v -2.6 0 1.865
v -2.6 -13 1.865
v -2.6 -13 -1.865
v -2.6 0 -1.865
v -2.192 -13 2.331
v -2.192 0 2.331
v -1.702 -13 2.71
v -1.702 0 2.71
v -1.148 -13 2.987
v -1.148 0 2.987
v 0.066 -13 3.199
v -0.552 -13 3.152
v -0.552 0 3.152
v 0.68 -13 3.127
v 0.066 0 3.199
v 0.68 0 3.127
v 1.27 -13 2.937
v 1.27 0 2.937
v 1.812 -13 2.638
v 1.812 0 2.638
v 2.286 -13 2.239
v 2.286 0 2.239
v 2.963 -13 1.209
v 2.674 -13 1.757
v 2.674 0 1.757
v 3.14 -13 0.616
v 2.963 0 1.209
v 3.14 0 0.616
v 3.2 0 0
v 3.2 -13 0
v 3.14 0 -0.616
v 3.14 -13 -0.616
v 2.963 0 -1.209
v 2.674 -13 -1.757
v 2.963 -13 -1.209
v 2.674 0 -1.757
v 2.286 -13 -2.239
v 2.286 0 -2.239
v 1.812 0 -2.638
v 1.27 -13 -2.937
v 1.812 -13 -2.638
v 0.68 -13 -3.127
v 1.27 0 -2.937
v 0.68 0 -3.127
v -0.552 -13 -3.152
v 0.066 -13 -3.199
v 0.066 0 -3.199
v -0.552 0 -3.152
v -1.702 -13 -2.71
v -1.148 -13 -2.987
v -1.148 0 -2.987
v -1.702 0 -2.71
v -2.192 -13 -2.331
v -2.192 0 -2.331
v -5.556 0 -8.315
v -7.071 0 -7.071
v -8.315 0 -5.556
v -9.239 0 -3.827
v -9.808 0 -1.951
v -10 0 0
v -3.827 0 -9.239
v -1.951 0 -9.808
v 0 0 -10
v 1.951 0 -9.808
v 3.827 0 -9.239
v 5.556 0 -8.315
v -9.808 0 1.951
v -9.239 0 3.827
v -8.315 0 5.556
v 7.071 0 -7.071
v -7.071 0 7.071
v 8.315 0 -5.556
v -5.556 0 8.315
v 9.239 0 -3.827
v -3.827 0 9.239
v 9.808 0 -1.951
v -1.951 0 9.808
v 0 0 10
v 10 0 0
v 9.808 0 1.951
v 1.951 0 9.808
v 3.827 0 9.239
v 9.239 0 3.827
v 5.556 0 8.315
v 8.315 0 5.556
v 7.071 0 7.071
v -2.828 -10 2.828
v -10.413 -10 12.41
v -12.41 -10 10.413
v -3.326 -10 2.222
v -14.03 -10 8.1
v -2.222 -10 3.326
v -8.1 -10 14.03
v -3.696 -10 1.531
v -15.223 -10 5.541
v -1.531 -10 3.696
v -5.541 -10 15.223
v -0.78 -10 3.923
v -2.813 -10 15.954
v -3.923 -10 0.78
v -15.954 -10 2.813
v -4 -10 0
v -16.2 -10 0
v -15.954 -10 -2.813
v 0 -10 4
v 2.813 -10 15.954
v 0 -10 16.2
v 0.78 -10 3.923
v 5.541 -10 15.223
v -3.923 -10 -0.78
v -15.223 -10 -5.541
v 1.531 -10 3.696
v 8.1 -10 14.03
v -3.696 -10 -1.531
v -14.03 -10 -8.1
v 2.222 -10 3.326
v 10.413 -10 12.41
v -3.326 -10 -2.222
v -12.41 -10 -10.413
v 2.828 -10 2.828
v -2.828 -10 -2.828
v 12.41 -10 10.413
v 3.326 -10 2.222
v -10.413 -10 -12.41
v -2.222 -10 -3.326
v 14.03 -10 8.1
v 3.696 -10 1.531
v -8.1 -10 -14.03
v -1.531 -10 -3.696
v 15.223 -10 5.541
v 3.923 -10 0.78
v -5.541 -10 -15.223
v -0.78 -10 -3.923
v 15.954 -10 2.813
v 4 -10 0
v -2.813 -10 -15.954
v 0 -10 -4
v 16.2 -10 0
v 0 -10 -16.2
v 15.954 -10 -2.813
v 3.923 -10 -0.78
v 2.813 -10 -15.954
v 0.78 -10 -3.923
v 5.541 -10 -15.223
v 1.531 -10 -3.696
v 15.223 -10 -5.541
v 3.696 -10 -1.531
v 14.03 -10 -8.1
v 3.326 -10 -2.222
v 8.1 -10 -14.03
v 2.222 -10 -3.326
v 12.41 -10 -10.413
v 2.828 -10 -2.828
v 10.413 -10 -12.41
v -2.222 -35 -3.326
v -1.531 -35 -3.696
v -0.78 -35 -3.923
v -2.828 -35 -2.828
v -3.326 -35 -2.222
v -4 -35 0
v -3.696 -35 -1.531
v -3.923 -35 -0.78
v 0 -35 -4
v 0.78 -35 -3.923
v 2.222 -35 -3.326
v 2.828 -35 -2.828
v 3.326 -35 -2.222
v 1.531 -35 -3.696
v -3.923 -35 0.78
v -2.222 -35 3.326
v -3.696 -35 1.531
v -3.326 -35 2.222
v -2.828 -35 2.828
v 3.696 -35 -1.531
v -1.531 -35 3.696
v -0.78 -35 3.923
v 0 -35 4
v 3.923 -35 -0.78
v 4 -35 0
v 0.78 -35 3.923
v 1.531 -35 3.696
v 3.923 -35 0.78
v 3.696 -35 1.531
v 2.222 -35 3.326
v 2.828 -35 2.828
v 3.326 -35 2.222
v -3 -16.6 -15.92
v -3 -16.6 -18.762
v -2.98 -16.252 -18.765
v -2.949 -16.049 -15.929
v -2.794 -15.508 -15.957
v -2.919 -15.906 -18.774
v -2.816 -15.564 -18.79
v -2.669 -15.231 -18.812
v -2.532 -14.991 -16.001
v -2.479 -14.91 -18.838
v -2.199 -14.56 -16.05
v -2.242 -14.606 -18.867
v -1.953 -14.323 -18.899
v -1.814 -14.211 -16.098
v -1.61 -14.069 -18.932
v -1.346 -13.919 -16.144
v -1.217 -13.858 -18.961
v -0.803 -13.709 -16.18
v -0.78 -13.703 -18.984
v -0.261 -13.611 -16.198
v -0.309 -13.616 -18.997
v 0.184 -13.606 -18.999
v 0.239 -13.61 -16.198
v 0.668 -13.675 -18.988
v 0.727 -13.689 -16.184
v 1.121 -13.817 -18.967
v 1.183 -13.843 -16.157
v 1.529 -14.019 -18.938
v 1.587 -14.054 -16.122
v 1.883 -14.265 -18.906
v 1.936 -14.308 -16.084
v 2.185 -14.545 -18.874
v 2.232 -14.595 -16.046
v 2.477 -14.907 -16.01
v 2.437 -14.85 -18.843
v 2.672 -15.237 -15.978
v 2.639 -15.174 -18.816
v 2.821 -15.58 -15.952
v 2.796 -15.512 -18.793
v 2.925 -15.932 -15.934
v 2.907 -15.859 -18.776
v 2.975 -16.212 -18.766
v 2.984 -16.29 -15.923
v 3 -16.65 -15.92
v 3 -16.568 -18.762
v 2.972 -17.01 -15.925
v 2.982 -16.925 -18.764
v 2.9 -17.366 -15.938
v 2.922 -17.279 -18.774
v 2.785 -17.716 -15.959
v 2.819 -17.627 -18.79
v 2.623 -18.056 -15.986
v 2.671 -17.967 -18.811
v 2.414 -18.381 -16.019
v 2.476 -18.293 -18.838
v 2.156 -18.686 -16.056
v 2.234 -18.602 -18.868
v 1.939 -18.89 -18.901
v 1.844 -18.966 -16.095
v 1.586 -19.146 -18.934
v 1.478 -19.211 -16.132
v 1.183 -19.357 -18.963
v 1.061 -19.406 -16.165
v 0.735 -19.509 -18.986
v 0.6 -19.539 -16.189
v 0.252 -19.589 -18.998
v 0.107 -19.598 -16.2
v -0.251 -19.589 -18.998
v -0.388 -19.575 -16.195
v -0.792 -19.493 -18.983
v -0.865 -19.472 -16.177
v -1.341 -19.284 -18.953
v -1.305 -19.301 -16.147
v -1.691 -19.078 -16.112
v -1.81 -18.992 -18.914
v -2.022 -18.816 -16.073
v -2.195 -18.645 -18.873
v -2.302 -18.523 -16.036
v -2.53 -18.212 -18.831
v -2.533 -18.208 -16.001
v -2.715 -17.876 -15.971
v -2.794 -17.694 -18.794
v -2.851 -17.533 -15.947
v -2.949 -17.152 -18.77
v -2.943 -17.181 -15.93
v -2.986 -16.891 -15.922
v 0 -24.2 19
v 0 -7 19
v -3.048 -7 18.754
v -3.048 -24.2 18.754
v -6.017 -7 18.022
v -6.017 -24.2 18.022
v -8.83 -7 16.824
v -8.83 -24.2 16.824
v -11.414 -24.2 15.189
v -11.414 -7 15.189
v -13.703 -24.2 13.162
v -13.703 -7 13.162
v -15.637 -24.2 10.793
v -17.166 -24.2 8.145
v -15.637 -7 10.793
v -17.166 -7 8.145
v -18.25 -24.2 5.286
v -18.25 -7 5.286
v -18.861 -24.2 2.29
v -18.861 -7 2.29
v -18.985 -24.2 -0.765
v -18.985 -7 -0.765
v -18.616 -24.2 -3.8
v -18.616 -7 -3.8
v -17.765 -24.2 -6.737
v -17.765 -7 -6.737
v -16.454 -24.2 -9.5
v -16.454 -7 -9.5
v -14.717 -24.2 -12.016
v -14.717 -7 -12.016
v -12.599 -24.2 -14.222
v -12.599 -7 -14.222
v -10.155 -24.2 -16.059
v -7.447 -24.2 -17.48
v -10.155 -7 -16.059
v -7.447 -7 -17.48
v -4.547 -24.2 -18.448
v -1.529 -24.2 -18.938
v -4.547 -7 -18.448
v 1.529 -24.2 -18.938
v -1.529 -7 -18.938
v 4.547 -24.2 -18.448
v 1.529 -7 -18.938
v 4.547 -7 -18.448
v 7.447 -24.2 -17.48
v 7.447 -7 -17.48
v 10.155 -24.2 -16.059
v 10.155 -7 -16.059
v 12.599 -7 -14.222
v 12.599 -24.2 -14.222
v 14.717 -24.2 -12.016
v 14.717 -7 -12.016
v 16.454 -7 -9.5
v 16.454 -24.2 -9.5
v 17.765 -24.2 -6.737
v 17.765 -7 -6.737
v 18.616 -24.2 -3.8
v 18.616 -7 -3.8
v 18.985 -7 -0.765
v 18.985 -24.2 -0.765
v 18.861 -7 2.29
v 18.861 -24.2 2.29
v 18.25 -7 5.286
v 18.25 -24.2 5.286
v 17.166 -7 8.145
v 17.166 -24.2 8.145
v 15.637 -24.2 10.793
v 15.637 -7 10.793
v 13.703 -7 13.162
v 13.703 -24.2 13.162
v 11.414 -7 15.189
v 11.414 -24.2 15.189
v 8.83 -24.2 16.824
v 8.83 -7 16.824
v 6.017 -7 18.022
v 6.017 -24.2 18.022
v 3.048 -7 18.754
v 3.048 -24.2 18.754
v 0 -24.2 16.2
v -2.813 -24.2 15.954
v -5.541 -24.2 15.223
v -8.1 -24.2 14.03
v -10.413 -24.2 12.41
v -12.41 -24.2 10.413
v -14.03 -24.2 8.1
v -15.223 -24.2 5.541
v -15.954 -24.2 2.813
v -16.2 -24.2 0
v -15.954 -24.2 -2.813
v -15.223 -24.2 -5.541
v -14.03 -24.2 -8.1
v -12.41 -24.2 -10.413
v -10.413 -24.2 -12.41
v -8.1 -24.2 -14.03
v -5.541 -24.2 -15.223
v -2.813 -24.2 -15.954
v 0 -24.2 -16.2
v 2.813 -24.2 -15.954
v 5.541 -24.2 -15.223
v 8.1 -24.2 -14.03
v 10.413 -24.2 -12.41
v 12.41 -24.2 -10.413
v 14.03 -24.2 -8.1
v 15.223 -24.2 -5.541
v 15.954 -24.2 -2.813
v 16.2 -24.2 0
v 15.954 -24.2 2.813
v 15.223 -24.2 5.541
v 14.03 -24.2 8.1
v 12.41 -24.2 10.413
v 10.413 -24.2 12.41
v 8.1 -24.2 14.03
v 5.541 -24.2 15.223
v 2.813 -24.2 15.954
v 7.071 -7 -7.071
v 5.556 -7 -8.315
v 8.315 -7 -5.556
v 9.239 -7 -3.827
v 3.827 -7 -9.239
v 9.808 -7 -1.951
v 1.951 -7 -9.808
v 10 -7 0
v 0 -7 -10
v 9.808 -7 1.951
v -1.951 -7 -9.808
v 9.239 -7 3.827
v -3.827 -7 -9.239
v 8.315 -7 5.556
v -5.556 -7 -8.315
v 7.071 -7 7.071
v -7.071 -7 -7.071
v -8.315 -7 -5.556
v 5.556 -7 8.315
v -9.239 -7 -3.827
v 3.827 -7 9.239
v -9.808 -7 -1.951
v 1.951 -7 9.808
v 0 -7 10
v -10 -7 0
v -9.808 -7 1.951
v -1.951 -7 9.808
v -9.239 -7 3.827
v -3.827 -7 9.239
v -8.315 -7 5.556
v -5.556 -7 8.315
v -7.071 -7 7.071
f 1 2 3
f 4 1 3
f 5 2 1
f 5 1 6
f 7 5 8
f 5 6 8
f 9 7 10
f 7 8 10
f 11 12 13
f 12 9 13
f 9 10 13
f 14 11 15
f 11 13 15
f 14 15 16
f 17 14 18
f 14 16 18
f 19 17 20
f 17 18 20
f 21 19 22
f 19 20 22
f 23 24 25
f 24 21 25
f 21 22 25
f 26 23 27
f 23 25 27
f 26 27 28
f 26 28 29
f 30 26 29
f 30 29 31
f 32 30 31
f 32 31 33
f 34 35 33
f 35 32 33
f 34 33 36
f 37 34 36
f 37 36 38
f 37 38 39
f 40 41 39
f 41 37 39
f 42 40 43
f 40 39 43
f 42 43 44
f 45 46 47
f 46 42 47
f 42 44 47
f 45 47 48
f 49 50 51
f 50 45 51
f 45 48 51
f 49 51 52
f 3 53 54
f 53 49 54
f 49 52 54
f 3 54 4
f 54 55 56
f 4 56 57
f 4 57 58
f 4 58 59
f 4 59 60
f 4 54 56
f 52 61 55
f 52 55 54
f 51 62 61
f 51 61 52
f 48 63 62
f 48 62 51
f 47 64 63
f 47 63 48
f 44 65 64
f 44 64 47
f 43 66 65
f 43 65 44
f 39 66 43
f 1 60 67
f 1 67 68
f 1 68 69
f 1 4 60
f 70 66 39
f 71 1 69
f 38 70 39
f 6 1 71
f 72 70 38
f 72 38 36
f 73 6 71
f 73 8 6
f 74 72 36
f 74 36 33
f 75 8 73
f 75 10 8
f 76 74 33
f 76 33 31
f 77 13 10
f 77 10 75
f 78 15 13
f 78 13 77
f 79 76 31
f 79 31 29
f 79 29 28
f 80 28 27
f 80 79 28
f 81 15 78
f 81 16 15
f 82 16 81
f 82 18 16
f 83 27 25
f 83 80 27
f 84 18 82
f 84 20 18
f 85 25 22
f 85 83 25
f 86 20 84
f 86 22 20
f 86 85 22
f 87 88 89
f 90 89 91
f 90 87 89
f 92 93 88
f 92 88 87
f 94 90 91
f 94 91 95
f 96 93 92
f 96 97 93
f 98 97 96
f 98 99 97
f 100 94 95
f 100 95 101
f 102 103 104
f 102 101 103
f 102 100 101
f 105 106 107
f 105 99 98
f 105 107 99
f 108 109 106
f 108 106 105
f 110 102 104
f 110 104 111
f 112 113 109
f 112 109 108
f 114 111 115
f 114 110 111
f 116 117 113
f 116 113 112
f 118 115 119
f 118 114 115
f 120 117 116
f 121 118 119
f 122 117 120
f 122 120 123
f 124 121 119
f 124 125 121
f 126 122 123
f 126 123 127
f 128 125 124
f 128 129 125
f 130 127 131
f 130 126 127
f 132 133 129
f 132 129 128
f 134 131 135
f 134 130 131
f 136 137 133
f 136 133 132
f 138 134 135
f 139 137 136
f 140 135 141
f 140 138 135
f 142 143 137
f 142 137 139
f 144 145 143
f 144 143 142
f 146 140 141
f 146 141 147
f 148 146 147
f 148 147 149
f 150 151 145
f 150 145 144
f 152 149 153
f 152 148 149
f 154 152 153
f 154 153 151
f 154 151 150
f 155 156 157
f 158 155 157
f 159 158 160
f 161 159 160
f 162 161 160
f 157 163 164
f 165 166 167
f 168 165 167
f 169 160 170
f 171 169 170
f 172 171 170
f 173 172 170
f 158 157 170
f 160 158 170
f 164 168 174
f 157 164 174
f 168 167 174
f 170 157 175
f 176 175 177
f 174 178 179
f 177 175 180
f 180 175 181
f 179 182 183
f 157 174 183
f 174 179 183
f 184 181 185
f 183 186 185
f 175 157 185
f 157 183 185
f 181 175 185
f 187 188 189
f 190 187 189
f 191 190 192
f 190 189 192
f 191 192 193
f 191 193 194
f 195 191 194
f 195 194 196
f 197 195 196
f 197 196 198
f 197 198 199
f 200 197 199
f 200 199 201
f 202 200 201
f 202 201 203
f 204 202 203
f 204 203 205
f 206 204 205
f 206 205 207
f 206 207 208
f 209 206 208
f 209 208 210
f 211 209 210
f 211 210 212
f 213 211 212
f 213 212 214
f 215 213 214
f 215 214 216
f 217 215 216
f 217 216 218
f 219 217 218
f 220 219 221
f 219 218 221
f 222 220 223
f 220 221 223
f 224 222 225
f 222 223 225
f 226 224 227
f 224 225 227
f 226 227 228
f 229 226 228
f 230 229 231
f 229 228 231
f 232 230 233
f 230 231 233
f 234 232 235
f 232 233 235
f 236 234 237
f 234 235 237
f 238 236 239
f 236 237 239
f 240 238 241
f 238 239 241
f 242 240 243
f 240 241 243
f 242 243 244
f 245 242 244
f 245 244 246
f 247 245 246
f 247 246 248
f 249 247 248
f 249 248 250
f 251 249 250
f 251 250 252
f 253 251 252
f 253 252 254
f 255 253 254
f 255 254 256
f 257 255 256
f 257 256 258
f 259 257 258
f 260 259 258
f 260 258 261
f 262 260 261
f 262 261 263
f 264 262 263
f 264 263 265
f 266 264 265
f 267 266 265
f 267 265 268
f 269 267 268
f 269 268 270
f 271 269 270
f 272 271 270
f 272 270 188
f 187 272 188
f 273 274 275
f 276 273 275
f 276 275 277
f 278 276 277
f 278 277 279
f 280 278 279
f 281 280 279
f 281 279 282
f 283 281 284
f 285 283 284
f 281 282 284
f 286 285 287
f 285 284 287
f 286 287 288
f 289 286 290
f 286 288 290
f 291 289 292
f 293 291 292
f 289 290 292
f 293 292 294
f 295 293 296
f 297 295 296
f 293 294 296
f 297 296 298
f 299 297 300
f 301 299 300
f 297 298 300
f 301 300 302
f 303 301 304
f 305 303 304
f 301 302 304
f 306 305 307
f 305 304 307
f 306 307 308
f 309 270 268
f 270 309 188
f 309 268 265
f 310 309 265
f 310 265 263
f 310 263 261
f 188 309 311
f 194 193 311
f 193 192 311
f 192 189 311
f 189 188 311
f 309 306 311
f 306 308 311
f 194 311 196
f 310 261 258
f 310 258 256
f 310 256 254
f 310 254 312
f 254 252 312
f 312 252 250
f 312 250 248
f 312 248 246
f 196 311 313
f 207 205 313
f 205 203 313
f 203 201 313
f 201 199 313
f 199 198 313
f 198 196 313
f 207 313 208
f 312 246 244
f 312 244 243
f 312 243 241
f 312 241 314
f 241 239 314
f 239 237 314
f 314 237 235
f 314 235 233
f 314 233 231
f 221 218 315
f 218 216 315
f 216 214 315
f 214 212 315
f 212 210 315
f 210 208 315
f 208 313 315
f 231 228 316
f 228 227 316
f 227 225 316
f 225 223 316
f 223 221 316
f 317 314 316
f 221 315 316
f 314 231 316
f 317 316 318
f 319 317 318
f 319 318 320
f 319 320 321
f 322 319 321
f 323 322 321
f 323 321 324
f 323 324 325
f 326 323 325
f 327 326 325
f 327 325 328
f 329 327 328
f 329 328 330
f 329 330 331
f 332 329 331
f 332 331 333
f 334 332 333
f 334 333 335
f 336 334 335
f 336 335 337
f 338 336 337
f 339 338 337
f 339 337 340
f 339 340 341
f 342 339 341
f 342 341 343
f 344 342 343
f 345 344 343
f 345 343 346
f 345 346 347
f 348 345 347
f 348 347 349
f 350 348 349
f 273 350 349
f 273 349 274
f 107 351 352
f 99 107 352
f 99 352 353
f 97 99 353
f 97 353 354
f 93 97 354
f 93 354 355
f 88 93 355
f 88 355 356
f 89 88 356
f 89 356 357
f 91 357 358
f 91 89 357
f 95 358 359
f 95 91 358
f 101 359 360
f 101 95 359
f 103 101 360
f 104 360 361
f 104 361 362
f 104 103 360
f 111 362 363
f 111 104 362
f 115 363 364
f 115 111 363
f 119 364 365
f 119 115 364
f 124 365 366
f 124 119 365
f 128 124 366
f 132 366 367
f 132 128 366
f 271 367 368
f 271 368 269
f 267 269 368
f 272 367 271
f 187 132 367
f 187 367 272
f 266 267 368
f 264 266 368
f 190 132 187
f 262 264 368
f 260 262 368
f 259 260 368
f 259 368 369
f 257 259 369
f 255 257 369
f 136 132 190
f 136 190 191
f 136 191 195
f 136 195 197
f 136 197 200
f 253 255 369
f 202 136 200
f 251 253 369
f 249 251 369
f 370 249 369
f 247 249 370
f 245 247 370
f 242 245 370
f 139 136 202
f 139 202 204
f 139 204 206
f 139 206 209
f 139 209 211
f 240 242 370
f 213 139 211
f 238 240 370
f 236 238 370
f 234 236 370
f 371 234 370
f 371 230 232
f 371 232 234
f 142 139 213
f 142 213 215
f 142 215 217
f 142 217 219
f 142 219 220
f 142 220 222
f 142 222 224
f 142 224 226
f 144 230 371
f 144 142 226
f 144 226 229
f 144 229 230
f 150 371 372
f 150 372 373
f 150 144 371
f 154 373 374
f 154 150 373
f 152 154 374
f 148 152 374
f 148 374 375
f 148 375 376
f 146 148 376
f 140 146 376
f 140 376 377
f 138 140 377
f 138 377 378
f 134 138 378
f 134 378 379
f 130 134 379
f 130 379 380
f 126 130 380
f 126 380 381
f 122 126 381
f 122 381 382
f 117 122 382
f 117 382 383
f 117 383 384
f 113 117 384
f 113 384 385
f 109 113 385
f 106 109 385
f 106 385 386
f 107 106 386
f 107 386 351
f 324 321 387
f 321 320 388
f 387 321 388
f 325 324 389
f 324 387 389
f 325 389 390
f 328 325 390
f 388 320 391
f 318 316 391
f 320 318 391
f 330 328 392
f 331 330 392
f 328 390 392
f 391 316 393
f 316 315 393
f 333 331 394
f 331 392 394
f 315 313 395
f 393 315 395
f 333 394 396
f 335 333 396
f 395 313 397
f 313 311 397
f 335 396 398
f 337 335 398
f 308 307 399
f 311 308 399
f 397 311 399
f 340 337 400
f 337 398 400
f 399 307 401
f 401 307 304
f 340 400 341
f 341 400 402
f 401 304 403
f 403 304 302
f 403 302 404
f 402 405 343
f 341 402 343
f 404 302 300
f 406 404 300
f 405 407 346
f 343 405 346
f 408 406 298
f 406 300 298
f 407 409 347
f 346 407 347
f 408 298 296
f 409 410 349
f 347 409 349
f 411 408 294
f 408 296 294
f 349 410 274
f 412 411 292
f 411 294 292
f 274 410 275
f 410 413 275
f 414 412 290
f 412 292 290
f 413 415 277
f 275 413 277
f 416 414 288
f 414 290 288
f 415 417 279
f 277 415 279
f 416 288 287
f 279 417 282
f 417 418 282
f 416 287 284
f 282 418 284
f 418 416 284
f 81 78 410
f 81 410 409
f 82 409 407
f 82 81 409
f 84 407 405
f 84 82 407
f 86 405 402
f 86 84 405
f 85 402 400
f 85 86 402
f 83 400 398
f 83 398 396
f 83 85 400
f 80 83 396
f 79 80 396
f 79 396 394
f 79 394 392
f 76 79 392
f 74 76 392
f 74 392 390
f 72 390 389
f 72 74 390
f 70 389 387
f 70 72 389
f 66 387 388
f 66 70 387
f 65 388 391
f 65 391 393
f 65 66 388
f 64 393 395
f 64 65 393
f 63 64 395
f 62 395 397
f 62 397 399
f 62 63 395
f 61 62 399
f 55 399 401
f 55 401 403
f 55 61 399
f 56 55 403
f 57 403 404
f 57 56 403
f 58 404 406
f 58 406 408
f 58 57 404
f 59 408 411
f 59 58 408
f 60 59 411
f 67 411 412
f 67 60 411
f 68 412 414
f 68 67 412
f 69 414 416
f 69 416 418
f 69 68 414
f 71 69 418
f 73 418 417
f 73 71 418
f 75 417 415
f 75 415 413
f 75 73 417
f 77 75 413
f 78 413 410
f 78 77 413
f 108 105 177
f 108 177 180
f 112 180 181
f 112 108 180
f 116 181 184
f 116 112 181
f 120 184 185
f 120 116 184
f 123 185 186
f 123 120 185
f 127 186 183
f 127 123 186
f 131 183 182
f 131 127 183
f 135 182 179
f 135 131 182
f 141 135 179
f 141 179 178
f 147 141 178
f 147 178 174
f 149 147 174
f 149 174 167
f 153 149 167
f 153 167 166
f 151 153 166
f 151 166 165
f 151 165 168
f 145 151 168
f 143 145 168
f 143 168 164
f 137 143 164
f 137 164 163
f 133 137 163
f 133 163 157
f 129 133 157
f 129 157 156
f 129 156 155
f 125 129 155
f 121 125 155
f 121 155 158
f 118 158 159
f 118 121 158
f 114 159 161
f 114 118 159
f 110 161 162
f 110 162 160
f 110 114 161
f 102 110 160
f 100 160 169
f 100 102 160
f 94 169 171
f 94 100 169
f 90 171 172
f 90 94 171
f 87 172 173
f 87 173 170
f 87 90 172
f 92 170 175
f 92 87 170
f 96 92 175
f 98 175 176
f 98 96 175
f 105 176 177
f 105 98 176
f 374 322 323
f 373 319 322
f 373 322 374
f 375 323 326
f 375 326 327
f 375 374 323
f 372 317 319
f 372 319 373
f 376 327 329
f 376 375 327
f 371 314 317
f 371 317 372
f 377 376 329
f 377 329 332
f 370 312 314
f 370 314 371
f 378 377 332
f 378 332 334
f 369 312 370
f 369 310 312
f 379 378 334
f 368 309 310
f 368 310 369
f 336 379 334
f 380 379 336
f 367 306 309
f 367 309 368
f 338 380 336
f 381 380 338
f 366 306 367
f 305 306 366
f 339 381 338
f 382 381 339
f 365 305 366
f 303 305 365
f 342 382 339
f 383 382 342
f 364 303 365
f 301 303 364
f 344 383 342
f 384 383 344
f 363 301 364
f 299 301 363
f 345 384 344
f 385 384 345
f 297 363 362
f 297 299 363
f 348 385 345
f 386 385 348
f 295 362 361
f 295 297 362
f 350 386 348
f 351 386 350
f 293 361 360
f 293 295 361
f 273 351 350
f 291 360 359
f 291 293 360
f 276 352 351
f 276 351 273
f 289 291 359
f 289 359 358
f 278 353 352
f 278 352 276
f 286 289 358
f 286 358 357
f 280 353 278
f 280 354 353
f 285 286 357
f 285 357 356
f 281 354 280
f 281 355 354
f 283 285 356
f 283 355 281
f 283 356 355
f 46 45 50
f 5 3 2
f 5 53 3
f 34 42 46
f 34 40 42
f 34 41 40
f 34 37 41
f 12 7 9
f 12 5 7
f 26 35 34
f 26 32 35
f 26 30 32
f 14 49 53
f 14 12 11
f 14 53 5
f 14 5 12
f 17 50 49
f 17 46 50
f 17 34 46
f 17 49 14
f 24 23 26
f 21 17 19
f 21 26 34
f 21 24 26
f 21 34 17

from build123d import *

# Parameters (mm, degrees)
ESQUISSE1_R             = 4
BOSS_EXTRU_1_DEPTH      = 35
ESQUISSE2_R             = 3.2
ENL_V_MAT_EXTRU_1_DEPTH = 13
BOSS_EXTRU_2_START      = 13
BOSS_EXTRU_2_DEPTH      = 13
ESQUISSE5_R             = 10
ESQUISSE5_R_2           = 4
BOSS_EXTRU_3_DEPTH      = 7
SKETCH2_R               = 16.2
SKETCH2_R_2             = 4
BOSS_EXTRUDE4_DEPTH     = 3
SKETCH2_8_R             = 19
SKETCH2_8_R_2           = 16.2
BOSS_EXTRUDE5_DEPTH     = 17.2
SKETCH4_R               = 3
CUT_EXTRUDE1_DEPTH      = 10


with BuildPart() as part:
    # Esquisse1 → Boss.-Extru.1 (new body)
    with BuildSketch(Plane(origin=(0, 0, 0), x_dir=(1, 0, 0), z_dir=(0, 1, 0))):
        Circle(ESQUISSE1_R)
    extrude(amount=-BOSS_EXTRU_1_DEPTH)

    # Esquisse2 → Enlèv. mat.-Extru.1 (cut)
    with BuildSketch(Plane(origin=(0, 0, 0), x_dir=(1, 0, 0), z_dir=(0, 1, 0))):
        Circle(ESQUISSE2_R)
    extrude(amount=-ENL_V_MAT_EXTRU_1_DEPTH, mode=Mode.SUBTRACT)

    # Esquisse4 → Boss.-Extru.2 (add)
    with BuildSketch(Plane(origin=(0, -13, 0), x_dir=(1, 0, 0), z_dir=(0, 1, 0)).offset(BOSS_EXTRU_2_START)):
        with BuildLine():
            Line((-2.6, -1.865475811), (-2.6, 0))
            Line((-2.6, 0), (-2.6, 1.865475811))
            ThreePointArc((-2.6, 1.865475811), (-3.2, 0), (-2.6, -1.865475811))
        make_face()
    extrude(amount=-BOSS_EXTRU_2_DEPTH)

    # Esquisse5 → Boss.-Extru.3 (add)
    with BuildSketch(Plane(origin=(0, 0, 0), x_dir=(1, 0, 0), z_dir=(0, 1, 0))):
        Circle(ESQUISSE5_R)
        Circle(ESQUISSE5_R_2, mode=Mode.SUBTRACT)
    extrude(amount=-BOSS_EXTRU_3_DEPTH)

    # Sketch2 → Boss-Extrude4 (add)
    with BuildSketch(Plane.XZ.offset(7)):
        Circle(SKETCH2_R)
        Circle(SKETCH2_R_2, mode=Mode.SUBTRACT)
    extrude(amount=BOSS_EXTRUDE4_DEPTH)

    # Sketch2<8> → Boss-Extrude5 (add)
    with BuildSketch(Plane.XZ.offset(7)):
        Circle(SKETCH2_8_R)
        Circle(SKETCH2_8_R_2, mode=Mode.SUBTRACT)
    extrude(amount=BOSS_EXTRUDE5_DEPTH)

    # Sketch4 → Cut-Extrude1 (cut)
    with BuildSketch(Plane(origin=(0, 0, -19), x_dir=(-1, 0, 0), z_dir=(0, 0, -1))):
        with Locations((0, -16.6)):
            Circle(SKETCH4_R)
    extrude(amount=-CUT_EXTRUDE1_DEPTH, mode=Mode.SUBTRACT)


solid = part.part
